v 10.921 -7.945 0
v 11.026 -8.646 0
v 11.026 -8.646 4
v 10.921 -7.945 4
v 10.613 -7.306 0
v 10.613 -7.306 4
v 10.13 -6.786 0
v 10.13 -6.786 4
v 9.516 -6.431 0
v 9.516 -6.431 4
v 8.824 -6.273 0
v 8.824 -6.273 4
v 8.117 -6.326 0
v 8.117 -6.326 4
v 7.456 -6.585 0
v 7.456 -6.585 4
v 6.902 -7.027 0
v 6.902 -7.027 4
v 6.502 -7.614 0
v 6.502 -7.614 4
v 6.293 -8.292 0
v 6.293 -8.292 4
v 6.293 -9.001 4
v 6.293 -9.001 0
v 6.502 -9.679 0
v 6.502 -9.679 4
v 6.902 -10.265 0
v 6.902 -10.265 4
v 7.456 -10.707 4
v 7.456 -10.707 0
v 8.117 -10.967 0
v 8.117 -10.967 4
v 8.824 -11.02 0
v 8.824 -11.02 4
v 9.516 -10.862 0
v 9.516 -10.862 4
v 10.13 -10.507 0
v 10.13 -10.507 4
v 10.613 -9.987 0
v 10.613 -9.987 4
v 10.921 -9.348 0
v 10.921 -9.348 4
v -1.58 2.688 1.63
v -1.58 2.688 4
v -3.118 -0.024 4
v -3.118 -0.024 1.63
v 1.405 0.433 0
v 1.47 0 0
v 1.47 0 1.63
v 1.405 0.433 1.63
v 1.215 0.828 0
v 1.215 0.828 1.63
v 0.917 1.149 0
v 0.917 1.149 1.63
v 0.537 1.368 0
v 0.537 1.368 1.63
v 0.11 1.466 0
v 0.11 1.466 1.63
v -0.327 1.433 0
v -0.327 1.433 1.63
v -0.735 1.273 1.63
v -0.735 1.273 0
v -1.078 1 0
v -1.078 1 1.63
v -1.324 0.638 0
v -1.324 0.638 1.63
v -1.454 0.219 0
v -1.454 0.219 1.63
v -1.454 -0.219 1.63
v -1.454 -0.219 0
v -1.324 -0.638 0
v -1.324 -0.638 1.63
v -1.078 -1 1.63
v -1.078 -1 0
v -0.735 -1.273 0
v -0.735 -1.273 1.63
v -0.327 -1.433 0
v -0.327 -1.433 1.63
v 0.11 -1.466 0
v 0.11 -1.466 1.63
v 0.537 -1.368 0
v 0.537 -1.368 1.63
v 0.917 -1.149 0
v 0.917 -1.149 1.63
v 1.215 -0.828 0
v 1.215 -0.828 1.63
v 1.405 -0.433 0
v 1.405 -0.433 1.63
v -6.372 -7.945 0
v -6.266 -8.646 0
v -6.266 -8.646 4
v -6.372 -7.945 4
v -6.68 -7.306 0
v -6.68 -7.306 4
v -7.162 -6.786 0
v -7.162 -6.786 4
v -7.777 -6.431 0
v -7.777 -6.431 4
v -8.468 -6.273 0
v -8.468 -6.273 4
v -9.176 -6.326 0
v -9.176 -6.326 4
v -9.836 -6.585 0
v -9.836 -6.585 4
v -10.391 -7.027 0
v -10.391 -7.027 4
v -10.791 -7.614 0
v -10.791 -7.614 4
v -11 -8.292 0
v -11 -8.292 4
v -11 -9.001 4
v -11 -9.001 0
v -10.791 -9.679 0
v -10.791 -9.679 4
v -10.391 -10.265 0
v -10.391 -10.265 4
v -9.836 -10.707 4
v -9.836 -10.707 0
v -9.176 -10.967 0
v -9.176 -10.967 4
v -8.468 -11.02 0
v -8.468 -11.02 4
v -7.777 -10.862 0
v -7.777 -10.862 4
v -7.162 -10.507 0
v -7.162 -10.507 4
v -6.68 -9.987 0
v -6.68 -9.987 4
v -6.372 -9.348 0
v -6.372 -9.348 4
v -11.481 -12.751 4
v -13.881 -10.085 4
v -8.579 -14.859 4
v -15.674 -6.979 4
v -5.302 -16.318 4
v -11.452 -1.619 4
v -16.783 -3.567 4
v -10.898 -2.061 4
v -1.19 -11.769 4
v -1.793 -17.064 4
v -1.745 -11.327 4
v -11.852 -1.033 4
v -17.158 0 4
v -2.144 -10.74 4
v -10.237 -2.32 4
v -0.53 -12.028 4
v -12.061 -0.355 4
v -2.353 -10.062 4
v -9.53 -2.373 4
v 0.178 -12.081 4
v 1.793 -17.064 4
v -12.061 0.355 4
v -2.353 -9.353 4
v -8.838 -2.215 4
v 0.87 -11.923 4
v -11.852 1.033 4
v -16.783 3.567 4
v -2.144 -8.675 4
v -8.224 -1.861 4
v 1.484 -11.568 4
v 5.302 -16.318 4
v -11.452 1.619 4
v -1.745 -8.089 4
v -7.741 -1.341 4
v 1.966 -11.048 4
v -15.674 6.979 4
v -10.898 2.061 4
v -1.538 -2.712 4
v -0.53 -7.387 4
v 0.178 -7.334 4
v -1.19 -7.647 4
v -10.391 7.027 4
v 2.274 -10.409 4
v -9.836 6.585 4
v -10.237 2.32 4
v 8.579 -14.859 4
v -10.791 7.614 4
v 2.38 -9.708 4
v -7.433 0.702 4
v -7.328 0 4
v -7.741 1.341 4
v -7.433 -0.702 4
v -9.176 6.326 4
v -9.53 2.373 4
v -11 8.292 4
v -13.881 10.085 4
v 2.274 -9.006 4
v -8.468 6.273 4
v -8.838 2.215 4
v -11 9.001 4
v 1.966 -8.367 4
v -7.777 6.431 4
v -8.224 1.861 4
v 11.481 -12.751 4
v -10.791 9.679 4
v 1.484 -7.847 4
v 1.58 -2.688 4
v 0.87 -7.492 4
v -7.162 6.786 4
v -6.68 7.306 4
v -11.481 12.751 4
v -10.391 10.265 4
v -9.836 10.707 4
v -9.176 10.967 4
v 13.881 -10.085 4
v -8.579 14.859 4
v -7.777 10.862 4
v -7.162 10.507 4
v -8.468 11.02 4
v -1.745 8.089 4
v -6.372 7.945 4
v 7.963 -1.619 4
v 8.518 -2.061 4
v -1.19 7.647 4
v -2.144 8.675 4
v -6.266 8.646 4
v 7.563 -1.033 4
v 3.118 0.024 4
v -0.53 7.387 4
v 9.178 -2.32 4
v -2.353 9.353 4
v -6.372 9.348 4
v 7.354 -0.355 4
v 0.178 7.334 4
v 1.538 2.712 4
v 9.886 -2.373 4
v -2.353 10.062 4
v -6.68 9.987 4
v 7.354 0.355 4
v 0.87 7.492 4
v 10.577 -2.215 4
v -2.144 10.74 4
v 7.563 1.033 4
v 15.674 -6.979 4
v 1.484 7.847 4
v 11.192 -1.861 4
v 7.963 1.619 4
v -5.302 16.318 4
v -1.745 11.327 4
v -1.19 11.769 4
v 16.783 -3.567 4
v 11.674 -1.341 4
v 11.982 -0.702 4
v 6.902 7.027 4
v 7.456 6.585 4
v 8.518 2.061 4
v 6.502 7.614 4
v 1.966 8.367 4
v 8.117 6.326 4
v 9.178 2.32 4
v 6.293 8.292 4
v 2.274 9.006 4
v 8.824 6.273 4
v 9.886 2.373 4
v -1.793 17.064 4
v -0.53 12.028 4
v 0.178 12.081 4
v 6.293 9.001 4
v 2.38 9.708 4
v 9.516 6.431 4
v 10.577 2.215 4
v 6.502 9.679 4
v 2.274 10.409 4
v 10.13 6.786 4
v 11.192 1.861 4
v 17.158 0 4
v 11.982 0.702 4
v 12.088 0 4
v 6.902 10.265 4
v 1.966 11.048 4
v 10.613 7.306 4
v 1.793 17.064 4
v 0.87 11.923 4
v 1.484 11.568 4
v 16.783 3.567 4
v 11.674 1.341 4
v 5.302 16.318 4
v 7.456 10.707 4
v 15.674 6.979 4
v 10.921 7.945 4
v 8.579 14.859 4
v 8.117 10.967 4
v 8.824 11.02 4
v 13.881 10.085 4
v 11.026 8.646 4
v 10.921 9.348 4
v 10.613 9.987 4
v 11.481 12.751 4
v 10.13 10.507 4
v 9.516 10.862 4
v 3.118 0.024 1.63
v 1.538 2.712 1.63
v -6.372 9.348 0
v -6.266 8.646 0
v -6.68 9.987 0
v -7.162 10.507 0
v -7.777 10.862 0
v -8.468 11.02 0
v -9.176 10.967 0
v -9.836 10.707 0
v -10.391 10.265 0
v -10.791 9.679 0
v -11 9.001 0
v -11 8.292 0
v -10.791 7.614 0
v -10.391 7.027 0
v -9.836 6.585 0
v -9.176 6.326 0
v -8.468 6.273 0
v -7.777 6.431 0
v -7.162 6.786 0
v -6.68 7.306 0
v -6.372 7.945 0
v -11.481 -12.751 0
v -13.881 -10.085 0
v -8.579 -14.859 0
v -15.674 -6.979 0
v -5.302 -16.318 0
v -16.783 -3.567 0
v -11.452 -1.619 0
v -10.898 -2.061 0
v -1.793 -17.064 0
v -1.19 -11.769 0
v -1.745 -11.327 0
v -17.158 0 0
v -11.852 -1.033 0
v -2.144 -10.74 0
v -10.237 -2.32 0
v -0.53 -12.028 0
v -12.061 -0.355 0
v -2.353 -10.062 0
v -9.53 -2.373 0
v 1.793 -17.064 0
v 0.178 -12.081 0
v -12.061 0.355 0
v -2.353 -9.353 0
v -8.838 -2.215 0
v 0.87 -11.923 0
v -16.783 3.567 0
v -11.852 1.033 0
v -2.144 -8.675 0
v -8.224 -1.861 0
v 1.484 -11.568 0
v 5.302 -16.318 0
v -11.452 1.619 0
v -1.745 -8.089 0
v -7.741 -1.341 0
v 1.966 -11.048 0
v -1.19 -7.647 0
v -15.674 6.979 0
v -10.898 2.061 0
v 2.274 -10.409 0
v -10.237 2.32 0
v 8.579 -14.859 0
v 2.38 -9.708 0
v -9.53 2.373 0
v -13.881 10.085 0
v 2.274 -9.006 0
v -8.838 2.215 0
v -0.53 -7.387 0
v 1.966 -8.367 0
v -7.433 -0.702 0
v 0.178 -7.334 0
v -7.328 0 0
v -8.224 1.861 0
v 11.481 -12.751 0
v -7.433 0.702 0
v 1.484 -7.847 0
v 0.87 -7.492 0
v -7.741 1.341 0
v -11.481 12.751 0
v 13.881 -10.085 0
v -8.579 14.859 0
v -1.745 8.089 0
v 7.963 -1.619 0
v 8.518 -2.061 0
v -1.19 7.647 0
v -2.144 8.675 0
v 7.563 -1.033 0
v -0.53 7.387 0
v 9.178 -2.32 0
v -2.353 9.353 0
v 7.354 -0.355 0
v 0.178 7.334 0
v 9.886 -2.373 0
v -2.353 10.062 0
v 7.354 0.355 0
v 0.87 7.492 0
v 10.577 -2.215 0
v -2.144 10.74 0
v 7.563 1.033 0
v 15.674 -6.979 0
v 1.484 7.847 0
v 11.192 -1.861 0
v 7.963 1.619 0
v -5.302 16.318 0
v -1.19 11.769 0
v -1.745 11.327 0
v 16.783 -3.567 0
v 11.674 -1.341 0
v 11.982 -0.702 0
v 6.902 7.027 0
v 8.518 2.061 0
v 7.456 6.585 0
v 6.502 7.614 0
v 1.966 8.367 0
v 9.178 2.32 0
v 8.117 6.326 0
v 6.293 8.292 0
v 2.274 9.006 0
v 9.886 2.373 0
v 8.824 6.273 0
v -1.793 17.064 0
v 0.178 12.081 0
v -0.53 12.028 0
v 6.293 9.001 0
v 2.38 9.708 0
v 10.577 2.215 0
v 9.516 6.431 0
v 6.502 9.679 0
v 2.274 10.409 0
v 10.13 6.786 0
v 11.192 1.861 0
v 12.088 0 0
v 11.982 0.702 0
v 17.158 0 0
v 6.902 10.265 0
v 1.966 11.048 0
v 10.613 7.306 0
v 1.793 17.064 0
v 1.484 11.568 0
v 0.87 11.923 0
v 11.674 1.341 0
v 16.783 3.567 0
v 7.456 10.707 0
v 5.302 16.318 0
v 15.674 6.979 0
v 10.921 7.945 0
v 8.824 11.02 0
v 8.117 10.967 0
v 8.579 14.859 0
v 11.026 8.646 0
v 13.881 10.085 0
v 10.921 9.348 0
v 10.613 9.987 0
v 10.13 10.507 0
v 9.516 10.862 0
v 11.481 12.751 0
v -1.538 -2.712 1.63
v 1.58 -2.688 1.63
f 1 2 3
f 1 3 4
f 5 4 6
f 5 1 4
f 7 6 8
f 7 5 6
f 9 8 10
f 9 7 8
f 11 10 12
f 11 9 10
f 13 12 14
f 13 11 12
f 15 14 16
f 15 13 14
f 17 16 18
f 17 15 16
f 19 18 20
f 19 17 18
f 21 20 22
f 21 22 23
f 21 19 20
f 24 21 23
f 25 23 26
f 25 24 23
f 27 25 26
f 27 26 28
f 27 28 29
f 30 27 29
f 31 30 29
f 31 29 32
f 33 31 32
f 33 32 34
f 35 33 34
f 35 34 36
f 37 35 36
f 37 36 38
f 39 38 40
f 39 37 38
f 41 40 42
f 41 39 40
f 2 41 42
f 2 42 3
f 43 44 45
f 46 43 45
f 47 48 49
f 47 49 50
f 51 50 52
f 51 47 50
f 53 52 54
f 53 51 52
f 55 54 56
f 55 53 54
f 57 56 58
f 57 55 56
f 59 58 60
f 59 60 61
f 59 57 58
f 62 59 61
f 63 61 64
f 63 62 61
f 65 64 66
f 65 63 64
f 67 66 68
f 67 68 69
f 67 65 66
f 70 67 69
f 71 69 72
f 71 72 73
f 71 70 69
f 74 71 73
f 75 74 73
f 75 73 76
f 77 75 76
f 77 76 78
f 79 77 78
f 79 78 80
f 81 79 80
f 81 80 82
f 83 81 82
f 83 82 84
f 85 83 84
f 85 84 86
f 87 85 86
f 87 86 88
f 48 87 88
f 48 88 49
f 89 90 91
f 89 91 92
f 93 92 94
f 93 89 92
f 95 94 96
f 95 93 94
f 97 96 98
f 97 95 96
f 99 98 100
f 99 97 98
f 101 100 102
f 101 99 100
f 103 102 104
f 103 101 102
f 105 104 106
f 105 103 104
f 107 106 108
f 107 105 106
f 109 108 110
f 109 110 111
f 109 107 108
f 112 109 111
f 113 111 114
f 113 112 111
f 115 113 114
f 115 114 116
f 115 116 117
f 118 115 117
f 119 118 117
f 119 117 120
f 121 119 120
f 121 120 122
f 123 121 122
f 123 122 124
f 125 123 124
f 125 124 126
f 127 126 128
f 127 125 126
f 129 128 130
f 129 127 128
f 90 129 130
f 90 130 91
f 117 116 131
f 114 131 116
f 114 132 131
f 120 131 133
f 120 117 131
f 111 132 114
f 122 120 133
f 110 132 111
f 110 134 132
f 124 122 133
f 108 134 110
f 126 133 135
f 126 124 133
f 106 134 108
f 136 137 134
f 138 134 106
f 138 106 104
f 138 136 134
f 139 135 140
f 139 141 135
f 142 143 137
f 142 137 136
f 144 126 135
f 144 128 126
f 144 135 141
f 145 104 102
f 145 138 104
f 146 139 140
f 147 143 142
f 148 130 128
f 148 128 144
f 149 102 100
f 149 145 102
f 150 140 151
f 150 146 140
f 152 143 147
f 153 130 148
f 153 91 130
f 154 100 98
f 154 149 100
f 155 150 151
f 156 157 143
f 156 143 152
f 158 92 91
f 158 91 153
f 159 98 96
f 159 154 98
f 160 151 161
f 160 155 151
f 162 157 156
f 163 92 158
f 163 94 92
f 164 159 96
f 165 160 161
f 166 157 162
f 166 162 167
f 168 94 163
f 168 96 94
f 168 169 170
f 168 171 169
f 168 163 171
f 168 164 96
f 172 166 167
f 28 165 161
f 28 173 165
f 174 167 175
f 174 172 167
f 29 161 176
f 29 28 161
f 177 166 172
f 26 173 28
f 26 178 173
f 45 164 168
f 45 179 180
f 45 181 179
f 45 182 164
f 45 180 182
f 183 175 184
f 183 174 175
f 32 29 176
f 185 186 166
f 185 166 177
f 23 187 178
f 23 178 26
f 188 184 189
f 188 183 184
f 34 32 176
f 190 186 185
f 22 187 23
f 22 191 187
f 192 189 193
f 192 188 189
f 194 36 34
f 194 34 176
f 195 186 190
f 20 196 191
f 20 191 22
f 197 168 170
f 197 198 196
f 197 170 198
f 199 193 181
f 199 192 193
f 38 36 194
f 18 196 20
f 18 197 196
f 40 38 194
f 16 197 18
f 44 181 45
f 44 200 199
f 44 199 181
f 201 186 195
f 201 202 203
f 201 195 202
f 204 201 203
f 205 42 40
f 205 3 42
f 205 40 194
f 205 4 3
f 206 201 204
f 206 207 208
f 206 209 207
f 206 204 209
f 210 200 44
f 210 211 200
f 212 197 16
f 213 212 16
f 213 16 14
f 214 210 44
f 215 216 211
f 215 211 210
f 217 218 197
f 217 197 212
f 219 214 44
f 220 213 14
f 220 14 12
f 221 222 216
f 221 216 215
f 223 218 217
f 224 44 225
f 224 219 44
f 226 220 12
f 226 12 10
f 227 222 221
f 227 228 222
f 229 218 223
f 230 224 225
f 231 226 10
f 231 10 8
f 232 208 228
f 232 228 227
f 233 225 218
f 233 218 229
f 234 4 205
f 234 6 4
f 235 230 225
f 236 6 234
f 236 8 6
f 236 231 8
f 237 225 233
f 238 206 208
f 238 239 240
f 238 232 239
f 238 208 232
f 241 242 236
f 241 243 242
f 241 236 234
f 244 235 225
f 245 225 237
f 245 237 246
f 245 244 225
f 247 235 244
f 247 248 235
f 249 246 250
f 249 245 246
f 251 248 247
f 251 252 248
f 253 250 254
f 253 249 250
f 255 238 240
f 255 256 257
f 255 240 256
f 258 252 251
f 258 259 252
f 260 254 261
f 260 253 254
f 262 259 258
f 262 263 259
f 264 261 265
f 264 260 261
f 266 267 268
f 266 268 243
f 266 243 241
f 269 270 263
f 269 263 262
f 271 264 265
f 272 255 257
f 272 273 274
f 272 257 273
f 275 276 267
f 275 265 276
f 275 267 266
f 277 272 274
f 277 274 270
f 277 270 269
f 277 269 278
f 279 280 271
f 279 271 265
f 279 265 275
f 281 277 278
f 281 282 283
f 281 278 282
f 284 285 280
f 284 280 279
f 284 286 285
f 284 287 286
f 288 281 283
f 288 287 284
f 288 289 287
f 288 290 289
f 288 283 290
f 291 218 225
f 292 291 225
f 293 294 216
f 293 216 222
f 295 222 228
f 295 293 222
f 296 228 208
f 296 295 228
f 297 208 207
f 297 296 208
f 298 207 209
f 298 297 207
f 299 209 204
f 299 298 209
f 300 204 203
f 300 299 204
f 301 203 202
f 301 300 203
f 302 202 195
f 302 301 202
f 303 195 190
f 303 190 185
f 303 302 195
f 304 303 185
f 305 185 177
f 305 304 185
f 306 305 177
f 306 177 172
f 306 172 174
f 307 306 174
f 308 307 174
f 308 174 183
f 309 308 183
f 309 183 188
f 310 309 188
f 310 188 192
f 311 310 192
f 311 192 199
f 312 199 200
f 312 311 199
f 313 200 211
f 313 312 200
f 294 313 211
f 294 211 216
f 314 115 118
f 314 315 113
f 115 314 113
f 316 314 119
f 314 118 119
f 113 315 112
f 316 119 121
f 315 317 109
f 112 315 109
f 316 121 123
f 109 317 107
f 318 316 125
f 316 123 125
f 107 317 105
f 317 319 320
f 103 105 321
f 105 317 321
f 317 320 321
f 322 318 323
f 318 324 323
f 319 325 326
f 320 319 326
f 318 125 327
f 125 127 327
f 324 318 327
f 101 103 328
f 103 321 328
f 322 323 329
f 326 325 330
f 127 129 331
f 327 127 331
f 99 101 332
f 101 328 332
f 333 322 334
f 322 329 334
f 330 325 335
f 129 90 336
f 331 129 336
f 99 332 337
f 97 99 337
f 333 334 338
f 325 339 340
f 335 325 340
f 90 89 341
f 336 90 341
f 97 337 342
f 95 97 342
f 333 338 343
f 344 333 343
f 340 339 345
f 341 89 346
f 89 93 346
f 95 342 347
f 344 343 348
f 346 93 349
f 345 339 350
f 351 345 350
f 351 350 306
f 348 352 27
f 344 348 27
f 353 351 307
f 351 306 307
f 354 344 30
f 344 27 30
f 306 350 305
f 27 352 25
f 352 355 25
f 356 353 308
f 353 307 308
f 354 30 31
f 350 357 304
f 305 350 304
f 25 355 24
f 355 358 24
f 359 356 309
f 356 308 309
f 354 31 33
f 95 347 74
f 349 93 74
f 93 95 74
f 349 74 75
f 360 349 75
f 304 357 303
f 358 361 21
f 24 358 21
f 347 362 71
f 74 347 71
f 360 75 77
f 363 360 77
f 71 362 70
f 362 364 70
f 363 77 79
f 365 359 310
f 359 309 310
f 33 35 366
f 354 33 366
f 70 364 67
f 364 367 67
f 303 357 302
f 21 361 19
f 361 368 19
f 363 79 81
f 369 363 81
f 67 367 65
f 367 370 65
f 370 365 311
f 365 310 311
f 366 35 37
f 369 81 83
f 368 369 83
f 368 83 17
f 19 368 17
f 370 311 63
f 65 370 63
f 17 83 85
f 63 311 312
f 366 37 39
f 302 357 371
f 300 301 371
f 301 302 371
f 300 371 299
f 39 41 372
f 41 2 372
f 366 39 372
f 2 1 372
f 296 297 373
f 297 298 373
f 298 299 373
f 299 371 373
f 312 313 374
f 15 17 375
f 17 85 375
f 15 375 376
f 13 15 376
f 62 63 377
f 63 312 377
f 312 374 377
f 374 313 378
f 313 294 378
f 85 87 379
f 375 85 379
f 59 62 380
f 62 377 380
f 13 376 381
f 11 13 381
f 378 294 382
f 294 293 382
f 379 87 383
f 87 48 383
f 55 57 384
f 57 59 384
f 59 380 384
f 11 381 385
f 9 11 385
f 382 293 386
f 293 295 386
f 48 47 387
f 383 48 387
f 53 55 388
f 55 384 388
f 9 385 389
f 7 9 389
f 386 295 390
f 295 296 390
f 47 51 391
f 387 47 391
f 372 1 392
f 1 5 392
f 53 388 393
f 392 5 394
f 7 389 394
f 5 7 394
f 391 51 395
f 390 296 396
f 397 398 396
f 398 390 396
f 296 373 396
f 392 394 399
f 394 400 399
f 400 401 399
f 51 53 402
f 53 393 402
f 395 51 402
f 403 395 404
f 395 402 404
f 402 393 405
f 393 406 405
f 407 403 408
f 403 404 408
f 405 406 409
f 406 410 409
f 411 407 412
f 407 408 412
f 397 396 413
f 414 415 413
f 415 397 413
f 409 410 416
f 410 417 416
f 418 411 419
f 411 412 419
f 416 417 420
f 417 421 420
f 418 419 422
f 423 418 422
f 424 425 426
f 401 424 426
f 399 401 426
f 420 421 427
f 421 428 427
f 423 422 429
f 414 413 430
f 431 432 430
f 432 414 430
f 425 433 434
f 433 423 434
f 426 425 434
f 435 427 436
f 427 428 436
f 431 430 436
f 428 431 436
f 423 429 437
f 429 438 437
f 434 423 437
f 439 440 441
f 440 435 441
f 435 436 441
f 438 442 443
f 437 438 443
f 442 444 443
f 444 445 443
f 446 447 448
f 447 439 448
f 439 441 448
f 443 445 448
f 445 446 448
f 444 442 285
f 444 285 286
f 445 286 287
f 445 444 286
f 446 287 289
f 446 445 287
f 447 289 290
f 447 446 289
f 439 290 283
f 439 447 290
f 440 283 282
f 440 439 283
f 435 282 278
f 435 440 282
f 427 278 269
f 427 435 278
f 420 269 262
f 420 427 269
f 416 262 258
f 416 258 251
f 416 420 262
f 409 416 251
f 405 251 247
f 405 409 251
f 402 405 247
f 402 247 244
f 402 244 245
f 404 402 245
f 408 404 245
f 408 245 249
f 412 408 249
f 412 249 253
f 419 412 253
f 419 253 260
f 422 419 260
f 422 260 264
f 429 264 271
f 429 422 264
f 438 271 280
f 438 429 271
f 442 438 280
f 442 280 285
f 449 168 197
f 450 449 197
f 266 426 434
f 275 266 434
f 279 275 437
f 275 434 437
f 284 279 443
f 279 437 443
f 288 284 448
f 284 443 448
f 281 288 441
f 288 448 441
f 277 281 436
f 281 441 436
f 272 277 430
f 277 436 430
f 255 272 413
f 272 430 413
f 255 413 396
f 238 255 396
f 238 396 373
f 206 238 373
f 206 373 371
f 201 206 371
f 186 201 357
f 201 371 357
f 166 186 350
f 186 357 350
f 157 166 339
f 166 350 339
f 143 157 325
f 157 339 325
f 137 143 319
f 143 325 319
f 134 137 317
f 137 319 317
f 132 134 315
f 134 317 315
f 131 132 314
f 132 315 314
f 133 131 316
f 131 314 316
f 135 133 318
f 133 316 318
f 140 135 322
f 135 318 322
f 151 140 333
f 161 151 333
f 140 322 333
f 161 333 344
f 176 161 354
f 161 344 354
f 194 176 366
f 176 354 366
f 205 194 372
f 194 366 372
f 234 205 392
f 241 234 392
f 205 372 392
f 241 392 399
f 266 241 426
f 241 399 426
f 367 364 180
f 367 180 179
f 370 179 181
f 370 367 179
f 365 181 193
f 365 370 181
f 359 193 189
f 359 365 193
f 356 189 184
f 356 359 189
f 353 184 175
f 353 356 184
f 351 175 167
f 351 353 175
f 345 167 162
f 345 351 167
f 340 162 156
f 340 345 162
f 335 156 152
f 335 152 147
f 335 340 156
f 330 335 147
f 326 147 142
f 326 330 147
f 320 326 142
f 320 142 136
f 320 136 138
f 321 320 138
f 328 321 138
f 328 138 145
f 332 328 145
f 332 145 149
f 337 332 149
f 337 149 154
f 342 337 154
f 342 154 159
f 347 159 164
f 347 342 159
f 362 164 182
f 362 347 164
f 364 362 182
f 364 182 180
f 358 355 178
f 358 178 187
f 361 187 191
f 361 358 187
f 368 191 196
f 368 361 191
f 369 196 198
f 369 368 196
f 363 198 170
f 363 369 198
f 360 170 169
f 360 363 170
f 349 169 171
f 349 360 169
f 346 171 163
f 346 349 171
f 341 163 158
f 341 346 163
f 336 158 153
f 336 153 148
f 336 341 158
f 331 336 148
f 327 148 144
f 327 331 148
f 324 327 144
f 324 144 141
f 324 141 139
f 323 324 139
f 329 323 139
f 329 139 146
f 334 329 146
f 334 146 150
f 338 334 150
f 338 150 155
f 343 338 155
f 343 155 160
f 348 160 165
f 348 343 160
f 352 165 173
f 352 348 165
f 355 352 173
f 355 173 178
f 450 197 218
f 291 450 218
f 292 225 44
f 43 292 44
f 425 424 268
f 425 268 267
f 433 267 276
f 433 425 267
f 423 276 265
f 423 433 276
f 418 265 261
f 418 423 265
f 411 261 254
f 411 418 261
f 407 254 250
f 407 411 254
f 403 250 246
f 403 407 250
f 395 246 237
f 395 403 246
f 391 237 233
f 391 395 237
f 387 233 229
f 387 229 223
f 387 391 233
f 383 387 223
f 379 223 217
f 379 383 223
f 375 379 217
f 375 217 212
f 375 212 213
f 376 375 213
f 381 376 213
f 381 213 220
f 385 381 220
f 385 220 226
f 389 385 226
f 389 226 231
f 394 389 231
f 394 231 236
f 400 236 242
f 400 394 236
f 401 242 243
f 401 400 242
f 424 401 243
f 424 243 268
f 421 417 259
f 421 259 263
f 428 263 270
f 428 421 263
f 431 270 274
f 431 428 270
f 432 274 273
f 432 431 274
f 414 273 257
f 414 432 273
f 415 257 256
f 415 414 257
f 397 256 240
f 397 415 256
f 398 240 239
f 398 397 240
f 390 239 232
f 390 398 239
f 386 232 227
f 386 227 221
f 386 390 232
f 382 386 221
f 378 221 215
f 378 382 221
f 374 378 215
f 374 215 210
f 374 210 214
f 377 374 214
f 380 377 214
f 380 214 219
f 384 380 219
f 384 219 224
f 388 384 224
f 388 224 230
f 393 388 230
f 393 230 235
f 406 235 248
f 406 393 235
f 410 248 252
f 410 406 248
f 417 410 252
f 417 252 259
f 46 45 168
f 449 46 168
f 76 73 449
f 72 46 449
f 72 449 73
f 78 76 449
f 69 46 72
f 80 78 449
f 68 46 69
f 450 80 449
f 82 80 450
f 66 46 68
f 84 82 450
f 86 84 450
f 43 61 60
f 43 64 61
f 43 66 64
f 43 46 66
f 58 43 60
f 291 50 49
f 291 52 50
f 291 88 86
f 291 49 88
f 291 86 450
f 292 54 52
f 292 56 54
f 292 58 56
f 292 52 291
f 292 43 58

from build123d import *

# Parameters (mm, degrees)
F0_R     = 17.1577
F0_R_2   = 2.38
F0_R_3   = 1.47
F1_DEPTH = 4
F2_R     = 1.47
F3_DEPTH = 2.37


with BuildPart() as f1:
    # F0 (on Top) → F1 (new body)
    with BuildSketch(Plane.XY):
        Circle(F0_R)
        with Locations((-8.64629, -8.64629)):
            Circle(F0_R_2, mode=Mode.SUBTRACT)
        with Locations((0, -9.7077)):
            Circle(F0_R_2, mode=Mode.SUBTRACT)
        with Locations((8.64629, -8.64629)):
            Circle(F0_R_2, mode=Mode.SUBTRACT)
        with Locations((-9.7077, 0)):
            Circle(F0_R_2, mode=Mode.SUBTRACT)
        with Locations((-8.64629, 8.64629)):
            Circle(F0_R_2, mode=Mode.SUBTRACT)
        Circle(F0_R_3, mode=Mode.SUBTRACT)
        with Locations((9.7077, 0)):
            Circle(F0_R_2, mode=Mode.SUBTRACT)
        with Locations((0, 9.7077)):
            Circle(F0_R_2, mode=Mode.SUBTRACT)
        with Locations((8.64629, 8.64629)):
            Circle(F0_R_2, mode=Mode.SUBTRACT)
    extrude(amount=F1_DEPTH)

    # F2 (on face) → F3 (cut)
    with BuildSketch(Plane.XY.offset(4)):
        Polygon((3.117599, 0.024062), (1.537961, 2.71195), (-1.579637, 2.687889), (-3.117599, -0.024062), (-1.537961, -2.71195), (1.579637, -2.687889), align=None)
        Circle(F2_R, mode=Mode.SUBTRACT)
    extrude(amount=-F3_DEPTH, mode=Mode.SUBTRACT)


solid = f1.part
